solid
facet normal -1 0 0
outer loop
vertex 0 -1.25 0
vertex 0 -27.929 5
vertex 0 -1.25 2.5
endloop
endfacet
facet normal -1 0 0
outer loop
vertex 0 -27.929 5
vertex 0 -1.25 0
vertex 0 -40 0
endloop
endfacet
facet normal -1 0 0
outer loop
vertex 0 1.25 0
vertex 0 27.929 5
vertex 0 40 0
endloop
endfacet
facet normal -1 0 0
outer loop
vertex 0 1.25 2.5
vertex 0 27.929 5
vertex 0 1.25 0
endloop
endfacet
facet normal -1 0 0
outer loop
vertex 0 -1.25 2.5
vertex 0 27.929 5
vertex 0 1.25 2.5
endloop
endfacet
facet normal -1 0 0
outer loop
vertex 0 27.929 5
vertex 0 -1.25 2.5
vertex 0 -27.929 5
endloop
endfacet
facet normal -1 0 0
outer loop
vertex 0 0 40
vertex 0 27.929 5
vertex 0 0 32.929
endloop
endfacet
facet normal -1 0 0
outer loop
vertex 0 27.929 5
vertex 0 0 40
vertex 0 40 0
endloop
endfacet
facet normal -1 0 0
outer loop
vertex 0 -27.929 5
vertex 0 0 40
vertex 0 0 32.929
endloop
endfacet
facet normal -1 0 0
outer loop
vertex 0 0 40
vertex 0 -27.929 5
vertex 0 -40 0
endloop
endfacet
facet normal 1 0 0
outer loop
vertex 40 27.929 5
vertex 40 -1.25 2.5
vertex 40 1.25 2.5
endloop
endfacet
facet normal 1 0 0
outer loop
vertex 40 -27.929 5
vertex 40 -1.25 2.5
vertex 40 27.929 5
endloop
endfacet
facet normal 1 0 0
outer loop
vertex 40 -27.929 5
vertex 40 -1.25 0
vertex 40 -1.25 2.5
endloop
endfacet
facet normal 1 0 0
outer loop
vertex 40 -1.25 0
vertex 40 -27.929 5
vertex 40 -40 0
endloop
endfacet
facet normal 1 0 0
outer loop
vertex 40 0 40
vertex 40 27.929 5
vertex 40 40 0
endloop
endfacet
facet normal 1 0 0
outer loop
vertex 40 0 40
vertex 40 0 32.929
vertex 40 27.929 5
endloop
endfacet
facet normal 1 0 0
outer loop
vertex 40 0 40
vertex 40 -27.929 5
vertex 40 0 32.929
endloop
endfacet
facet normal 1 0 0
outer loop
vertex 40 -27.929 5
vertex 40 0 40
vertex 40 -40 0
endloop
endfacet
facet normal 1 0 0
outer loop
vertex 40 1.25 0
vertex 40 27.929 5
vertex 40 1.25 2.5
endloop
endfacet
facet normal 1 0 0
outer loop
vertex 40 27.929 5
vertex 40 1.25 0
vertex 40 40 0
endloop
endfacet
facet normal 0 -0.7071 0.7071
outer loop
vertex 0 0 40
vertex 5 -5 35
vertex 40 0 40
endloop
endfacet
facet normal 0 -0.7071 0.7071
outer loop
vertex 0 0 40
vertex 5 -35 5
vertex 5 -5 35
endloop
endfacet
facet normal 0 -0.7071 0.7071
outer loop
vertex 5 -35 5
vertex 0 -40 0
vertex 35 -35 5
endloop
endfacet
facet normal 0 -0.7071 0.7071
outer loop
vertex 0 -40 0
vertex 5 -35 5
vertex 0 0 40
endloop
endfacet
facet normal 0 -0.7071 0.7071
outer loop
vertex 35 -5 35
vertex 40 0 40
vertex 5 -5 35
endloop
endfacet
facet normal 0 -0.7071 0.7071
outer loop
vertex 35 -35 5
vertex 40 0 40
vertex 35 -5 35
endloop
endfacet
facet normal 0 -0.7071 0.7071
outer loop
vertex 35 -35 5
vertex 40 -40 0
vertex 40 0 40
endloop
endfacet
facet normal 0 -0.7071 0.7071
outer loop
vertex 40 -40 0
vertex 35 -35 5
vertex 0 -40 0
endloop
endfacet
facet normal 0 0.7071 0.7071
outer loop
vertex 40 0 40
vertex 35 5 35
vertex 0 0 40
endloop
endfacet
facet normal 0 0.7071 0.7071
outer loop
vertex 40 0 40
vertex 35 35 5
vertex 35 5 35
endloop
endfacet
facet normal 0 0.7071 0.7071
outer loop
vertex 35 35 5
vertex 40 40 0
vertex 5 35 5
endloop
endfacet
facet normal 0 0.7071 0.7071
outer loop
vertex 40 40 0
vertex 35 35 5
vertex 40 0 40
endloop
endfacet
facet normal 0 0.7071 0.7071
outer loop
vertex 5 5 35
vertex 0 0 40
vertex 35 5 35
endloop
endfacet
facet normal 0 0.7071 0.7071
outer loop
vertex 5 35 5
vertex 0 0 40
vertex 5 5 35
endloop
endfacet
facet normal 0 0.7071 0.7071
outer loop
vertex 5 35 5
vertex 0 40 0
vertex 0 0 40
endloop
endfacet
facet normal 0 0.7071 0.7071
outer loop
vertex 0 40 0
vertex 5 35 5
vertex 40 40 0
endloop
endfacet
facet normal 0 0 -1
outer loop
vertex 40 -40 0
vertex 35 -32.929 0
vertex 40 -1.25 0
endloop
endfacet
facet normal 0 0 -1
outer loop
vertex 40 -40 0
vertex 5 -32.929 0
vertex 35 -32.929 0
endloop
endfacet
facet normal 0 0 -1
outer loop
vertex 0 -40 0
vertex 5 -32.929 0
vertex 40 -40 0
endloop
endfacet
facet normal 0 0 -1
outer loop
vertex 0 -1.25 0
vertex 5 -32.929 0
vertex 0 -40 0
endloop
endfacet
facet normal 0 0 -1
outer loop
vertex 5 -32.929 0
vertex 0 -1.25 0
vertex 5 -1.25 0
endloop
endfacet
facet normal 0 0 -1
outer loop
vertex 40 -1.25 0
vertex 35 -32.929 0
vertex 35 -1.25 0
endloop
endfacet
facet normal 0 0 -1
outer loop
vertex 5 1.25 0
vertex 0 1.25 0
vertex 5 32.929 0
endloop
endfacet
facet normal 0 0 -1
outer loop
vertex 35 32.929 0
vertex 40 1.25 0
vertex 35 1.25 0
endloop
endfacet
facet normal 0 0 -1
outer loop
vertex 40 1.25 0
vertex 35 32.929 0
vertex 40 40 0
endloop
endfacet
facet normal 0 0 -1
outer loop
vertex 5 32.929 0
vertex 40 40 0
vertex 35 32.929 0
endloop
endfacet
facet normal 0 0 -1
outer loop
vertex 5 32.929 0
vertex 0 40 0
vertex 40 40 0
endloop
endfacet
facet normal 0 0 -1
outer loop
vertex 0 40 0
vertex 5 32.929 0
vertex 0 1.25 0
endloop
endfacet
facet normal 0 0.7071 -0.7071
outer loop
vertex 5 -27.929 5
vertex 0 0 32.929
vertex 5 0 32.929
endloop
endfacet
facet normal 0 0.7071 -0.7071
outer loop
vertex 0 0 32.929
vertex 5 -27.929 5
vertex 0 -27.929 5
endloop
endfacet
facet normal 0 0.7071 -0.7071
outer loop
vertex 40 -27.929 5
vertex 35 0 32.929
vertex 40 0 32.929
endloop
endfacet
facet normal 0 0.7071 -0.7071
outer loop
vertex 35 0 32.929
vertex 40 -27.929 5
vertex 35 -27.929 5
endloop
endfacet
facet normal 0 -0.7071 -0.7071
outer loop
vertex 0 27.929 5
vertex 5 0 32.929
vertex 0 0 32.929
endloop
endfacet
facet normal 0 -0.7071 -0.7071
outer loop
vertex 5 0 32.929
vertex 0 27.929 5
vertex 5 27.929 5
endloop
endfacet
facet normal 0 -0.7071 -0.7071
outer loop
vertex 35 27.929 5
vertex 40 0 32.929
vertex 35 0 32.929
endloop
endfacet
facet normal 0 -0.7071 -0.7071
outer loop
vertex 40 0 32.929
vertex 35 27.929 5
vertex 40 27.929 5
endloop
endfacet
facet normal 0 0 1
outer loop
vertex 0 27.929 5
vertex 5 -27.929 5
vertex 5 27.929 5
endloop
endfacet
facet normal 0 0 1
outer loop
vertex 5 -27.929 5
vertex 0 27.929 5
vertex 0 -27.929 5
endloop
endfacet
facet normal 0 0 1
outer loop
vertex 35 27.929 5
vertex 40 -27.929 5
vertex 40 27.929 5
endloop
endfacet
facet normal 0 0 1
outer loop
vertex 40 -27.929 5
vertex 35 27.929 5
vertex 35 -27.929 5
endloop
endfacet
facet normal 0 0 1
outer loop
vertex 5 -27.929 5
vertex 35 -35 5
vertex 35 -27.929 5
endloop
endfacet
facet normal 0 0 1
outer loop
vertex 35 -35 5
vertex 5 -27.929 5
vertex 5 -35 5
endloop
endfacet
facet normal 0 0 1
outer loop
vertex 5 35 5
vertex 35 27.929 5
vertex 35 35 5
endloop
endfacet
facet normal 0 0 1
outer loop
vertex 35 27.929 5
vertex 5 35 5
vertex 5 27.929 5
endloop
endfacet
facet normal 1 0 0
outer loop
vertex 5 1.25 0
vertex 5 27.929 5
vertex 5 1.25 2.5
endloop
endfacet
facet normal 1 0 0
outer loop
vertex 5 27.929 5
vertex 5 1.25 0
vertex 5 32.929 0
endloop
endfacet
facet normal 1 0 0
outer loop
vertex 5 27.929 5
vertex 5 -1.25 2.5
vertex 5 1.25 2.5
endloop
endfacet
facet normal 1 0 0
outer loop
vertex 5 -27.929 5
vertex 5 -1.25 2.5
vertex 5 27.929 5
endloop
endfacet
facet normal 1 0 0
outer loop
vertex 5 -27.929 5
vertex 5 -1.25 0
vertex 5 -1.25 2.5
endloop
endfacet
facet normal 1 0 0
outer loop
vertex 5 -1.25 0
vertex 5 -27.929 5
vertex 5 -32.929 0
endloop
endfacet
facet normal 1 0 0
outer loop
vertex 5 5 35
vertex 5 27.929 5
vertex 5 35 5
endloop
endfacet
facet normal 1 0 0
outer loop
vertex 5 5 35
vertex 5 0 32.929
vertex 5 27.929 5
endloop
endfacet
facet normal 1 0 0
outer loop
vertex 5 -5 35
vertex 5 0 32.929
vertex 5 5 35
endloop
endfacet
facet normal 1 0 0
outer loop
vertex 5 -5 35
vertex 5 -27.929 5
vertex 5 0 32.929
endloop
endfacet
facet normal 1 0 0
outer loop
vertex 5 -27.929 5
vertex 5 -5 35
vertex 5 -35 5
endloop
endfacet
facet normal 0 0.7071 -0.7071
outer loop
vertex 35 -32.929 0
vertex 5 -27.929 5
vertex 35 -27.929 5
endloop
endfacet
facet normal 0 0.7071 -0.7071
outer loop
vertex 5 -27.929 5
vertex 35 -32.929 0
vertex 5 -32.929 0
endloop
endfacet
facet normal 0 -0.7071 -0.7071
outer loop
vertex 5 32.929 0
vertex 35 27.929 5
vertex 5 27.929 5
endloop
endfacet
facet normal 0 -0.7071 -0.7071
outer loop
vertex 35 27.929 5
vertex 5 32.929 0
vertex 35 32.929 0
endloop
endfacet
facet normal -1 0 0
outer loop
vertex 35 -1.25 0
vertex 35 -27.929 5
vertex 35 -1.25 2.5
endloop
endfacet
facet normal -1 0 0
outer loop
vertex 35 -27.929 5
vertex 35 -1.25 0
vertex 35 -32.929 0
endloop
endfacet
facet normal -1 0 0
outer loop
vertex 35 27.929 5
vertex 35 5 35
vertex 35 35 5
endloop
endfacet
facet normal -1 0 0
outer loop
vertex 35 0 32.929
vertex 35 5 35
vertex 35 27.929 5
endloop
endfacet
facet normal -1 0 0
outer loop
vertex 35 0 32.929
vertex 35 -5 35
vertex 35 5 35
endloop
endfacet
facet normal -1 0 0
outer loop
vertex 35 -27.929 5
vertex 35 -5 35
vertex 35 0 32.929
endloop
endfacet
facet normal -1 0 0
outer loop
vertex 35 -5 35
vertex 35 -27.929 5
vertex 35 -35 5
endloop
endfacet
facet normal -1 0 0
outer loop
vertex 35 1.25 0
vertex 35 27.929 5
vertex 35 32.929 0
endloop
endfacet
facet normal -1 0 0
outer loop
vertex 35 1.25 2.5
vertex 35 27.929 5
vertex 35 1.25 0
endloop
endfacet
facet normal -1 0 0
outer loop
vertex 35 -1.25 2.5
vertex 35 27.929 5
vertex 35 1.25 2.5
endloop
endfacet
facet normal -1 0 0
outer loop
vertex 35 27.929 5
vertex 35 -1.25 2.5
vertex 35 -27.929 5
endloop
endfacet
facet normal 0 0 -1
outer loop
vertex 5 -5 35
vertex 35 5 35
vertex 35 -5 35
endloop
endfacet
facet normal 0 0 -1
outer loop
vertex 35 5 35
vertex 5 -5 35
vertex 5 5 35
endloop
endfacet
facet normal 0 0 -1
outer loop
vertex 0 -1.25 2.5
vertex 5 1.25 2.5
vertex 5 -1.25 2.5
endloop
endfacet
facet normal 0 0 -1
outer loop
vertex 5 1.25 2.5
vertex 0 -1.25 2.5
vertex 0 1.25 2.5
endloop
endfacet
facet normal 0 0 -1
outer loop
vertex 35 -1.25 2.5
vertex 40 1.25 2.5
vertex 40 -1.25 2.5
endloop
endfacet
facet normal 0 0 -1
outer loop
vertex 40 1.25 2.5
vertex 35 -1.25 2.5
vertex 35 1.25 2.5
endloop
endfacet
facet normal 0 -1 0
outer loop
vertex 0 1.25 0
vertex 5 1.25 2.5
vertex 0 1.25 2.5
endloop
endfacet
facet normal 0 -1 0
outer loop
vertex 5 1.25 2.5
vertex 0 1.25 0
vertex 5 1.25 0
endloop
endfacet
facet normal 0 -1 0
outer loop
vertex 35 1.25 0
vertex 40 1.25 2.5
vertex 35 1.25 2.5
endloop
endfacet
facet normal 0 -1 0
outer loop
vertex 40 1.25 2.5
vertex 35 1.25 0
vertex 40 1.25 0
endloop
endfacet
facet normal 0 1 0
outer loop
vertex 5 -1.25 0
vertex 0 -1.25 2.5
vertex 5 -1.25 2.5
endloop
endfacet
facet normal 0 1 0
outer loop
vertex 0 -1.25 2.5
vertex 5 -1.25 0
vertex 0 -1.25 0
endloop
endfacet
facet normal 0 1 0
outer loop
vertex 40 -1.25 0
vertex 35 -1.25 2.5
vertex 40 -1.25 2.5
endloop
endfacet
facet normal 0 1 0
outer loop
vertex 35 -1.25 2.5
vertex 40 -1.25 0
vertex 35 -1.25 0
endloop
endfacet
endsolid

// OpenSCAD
triangle_height = 40;
triangle_width = 40;
side_length = sqrt(2) * triangle_height;
beam_width = 5;
smaller_side_length = side_length - beam_width* (1 + sqrt(2))*sqrt(2);

module triangle(side, z){
    difference() {
        translate([0, 0, -side/sqrt(2)])
        rotate([45, 0, 0])
        cube([z, side, side]);
        
        // Cut off bottom
        translate([-500, -500, -1000])
        cube([1000, 1000, 1000]);
    };
};

module truss(){
    difference(){
        triangle(side_length, triangle_width);
        // hollow out triangle cross section
        translate([-0.5, 0, beam_width])

        triangle(smaller_side_length, triangle_width + 1);
        
        translate([beam_width, -500, , beam_width])
        cube([triangle_width - beam_width*2, 1000, triangle_height- beam_width*(2)]);
        
        //hollow base
        translate([beam_width, 0, -(beam_width*(sqrt(2)))])
        triangle(side_length, triangle_width - 2*beam_width);
    }
};

module notch(){
    translate([-500, -beam_width/4, 0])
    cube([1000, beam_width/2, beam_width/2]);
};


difference(){
    truss();
    notch();
};
